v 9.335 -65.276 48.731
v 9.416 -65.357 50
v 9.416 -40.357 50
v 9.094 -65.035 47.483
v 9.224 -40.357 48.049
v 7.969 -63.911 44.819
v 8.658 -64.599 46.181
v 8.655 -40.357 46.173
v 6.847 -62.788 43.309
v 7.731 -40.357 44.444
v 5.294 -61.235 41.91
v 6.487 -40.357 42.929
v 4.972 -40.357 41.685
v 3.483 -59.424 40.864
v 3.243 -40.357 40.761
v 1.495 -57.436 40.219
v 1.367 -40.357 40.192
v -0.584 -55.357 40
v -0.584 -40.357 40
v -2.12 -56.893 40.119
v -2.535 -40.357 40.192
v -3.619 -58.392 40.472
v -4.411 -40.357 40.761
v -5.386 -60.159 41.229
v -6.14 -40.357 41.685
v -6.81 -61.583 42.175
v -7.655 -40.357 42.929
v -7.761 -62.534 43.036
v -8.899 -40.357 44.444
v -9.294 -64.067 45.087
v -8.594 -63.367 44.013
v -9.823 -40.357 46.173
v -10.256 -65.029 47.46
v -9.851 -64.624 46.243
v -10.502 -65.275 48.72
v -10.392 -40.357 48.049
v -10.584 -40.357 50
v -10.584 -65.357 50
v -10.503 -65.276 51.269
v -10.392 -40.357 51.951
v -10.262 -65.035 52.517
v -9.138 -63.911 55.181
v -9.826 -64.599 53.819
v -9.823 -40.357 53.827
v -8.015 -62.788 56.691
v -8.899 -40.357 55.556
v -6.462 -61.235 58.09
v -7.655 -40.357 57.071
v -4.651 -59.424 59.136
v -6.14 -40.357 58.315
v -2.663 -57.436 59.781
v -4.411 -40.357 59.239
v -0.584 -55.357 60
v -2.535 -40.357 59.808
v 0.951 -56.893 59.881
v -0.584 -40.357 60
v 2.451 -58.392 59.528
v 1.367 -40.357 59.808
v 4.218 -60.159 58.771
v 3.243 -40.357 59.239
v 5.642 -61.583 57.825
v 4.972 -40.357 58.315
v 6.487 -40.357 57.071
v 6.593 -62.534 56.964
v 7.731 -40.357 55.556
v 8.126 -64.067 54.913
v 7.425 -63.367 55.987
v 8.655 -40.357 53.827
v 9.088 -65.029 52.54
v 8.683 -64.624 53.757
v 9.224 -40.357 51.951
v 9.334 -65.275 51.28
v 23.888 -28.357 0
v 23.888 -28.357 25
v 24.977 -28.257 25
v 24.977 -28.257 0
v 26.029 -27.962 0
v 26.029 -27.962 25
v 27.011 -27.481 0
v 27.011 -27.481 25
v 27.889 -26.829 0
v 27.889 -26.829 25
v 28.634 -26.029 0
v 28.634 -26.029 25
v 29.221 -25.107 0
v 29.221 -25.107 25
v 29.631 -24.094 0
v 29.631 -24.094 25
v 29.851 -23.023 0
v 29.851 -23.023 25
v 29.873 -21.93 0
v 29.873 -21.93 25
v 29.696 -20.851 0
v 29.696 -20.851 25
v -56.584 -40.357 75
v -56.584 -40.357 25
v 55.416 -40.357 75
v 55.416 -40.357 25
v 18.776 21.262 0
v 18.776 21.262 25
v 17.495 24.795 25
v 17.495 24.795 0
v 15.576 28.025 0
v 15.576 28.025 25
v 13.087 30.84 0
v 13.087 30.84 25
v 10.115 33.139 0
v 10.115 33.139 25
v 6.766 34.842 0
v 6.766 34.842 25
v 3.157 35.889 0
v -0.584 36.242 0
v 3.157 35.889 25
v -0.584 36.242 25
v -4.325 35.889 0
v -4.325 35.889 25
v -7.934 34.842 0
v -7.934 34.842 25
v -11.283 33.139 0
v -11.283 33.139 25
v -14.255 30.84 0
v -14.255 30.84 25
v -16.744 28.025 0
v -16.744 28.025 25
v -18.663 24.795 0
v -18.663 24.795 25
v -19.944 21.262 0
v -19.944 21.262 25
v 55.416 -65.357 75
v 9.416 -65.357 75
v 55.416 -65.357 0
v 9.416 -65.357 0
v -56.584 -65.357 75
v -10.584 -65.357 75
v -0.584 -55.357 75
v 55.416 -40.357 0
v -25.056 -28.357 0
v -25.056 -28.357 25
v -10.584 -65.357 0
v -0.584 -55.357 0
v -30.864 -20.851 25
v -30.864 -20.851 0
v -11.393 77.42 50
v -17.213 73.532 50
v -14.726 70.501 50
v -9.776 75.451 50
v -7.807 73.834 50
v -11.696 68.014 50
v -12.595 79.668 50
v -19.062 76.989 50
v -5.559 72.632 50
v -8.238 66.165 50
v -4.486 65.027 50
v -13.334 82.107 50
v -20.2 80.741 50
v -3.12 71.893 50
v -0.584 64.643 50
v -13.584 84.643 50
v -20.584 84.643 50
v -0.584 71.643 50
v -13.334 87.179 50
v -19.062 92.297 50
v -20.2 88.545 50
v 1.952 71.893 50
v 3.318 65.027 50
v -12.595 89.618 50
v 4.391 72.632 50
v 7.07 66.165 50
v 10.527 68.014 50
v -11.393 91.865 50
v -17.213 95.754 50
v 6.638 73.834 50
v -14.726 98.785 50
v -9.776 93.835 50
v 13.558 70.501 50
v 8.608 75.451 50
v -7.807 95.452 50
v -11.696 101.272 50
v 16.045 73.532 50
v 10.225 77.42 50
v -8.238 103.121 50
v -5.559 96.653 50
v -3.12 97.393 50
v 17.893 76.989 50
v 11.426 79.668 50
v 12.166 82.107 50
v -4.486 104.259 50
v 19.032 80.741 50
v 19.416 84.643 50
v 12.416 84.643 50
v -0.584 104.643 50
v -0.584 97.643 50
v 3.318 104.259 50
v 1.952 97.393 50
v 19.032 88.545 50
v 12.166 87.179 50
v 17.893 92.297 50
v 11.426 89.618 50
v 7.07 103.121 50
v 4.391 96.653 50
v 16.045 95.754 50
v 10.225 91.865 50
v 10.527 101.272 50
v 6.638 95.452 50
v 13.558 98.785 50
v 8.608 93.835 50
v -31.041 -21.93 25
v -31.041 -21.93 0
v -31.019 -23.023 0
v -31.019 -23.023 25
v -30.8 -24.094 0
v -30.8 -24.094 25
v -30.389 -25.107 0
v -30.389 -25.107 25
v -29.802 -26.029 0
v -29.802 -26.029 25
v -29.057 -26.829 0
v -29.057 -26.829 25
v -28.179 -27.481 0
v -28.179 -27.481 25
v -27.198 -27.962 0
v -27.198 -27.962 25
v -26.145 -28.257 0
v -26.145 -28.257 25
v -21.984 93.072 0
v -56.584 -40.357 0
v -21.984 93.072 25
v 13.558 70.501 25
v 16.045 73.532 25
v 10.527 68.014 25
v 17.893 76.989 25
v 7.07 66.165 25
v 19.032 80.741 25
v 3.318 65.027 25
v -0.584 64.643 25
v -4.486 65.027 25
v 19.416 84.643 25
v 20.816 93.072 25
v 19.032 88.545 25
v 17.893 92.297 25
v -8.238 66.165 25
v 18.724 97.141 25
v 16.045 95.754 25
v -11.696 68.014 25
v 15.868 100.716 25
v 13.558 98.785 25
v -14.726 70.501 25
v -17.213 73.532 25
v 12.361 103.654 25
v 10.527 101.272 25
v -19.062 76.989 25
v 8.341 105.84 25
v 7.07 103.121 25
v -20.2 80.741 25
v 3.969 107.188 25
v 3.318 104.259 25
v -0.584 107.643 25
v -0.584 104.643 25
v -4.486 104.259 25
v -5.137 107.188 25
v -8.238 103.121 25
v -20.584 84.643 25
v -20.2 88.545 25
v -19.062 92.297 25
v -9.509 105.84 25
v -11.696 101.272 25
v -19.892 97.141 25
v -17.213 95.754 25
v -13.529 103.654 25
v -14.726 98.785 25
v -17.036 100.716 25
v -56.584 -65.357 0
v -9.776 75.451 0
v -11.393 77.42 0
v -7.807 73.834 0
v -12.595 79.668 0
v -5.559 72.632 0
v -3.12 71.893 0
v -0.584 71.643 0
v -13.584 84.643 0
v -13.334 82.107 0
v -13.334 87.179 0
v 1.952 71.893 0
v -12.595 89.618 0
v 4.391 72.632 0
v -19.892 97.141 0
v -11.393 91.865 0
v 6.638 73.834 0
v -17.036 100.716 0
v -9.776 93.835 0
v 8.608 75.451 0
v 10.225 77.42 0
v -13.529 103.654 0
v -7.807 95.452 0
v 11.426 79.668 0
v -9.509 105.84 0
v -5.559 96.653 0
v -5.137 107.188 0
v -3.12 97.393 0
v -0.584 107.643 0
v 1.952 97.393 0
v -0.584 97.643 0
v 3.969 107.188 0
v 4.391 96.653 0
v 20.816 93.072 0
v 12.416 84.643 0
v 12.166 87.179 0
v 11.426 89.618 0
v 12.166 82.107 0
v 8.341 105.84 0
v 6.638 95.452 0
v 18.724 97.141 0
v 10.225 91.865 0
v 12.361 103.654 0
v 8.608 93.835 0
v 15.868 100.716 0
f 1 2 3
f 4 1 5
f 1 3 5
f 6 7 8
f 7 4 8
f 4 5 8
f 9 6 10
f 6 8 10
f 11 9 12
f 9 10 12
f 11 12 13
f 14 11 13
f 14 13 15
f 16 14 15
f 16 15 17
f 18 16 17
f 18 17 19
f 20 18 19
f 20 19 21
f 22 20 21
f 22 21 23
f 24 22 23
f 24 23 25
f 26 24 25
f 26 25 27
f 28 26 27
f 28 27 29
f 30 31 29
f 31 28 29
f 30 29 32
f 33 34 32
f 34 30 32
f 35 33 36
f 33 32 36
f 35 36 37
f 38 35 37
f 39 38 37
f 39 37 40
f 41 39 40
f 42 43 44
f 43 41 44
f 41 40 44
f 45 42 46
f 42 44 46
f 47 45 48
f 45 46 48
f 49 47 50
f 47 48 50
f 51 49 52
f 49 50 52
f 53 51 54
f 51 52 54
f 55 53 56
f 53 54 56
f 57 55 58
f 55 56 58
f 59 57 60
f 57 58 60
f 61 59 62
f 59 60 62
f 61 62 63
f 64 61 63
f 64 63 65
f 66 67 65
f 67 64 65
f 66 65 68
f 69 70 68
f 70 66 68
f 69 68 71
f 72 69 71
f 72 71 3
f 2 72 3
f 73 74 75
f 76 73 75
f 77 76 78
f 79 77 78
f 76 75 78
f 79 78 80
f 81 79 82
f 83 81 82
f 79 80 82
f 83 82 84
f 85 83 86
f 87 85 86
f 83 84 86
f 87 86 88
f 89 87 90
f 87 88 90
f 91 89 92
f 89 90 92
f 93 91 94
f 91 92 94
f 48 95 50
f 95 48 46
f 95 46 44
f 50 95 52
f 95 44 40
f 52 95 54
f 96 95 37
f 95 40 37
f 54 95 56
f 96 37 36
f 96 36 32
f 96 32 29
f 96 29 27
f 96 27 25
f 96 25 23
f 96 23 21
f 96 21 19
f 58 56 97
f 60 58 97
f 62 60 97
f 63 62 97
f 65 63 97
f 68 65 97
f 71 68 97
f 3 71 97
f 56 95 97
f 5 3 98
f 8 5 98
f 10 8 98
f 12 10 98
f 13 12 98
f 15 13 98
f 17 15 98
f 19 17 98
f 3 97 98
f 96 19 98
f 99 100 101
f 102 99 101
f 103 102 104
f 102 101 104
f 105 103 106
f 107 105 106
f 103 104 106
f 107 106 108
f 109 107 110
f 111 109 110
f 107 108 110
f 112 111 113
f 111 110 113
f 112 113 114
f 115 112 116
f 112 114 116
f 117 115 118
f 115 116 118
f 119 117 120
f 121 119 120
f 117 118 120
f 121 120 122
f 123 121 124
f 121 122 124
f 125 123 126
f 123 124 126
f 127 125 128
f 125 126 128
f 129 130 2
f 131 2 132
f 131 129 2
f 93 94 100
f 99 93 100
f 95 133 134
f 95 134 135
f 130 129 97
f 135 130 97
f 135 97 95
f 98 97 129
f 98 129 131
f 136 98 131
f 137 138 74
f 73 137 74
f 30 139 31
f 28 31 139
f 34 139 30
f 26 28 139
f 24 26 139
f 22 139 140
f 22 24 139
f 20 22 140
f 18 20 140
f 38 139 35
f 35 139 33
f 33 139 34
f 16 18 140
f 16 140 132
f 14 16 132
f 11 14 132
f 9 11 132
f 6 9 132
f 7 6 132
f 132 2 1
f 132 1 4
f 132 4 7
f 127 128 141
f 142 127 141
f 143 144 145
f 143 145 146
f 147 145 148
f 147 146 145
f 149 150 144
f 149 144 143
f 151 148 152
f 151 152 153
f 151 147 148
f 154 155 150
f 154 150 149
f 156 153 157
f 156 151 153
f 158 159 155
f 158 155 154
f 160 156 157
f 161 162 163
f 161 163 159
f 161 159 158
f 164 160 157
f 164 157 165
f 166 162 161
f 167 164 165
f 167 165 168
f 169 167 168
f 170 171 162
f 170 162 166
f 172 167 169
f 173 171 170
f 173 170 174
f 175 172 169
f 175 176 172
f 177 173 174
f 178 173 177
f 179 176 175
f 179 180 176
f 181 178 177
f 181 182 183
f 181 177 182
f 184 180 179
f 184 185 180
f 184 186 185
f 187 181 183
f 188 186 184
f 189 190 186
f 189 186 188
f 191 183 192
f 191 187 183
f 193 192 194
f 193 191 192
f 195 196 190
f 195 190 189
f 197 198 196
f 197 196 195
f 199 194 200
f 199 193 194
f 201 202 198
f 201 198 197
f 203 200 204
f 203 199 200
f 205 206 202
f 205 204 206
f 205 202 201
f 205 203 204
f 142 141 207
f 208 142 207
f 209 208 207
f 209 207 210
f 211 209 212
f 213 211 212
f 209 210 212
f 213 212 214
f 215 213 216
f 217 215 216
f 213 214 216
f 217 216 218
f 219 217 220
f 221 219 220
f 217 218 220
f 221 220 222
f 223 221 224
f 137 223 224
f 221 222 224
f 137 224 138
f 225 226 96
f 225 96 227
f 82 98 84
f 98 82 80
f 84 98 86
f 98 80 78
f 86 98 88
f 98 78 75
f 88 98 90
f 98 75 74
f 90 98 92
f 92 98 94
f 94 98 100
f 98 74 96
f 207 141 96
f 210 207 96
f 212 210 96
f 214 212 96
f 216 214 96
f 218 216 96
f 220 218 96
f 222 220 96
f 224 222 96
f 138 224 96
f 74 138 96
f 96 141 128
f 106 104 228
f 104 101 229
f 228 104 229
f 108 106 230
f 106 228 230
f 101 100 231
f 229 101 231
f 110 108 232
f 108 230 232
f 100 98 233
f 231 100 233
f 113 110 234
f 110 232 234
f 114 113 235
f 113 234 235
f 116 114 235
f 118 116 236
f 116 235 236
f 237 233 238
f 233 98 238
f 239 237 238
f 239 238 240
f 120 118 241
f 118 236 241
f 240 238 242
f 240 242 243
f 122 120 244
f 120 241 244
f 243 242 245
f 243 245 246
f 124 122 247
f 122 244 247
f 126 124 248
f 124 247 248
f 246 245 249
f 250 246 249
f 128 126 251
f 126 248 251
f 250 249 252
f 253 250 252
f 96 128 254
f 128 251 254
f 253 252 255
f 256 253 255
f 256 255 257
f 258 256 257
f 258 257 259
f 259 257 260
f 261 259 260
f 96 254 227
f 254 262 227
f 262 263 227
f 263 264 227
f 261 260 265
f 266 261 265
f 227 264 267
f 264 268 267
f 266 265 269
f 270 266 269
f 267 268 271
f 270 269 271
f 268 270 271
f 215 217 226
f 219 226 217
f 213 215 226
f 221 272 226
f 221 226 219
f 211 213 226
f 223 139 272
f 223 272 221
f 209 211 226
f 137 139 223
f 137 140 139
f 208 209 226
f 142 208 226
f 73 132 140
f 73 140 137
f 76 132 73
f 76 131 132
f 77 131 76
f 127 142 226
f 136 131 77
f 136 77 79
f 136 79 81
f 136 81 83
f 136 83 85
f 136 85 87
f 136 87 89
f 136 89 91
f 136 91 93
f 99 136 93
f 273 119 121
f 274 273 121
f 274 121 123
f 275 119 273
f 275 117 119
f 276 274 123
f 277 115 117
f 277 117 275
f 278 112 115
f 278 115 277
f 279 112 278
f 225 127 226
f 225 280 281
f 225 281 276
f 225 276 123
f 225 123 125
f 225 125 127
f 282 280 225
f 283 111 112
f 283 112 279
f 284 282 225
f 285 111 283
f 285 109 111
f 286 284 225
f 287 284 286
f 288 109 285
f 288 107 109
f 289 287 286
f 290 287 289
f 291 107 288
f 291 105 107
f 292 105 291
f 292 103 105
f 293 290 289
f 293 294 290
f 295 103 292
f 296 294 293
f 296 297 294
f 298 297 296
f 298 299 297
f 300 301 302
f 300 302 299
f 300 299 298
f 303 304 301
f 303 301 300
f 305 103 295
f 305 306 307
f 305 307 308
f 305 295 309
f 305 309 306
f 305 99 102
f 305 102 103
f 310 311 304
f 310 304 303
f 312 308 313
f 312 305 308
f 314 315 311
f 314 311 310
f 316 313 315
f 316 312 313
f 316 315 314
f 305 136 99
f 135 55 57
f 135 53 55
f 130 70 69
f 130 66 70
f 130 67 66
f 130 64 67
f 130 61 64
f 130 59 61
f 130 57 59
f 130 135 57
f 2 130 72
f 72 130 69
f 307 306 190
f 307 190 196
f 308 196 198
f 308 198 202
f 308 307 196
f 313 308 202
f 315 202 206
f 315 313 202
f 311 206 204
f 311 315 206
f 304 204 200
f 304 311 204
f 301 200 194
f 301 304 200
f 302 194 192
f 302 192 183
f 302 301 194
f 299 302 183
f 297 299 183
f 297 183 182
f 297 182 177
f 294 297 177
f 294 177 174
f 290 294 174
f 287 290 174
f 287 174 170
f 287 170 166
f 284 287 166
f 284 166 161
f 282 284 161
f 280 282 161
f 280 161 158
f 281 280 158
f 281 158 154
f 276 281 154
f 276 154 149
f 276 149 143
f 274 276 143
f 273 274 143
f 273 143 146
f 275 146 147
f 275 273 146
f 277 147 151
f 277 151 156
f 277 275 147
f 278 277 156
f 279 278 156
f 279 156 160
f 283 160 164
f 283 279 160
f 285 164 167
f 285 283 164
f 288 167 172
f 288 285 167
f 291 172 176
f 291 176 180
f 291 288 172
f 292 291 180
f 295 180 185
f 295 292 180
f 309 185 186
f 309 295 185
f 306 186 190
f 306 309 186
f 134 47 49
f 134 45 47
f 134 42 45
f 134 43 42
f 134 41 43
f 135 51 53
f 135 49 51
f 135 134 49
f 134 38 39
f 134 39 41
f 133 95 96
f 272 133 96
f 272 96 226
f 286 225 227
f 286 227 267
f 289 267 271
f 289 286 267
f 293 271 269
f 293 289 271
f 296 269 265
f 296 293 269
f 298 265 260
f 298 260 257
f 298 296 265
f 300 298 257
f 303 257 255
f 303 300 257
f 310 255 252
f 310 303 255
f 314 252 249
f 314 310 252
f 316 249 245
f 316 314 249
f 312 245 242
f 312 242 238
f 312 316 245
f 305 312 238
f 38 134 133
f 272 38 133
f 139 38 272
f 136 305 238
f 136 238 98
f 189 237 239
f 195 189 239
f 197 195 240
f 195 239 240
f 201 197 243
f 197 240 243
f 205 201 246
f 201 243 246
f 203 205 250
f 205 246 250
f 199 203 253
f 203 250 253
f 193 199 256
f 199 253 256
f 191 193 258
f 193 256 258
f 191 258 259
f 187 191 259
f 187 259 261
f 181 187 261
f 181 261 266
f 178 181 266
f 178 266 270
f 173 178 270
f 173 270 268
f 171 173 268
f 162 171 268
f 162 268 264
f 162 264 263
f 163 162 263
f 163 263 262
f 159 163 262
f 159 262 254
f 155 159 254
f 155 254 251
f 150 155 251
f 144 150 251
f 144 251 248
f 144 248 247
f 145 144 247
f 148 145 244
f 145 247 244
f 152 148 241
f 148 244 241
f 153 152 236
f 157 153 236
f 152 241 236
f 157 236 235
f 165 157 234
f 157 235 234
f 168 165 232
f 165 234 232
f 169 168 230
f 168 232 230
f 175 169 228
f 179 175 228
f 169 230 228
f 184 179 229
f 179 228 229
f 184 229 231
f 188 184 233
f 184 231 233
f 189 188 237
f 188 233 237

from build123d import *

# Parameters (mm, degrees)
IZIM1_R                          = 20
IZIM1_R_2                        = 13
Y_KSEKLIK_EKSTR_ZYON1_DEPTH      = 25
IZIM2_W                          = 75
IZIM2_H                          = 25
Y_KSEKLIK_EKSTR_ZYON3_DEPTH      = 55.415897
Y_KSEKLIK_EKSTR_ZYON3_DEPTH_BACK = 56.584103
KES_EKSTR_ZYON1_DEPTH            = 76
IZIM5_R                          = 10
KES_EKSTR_ZYON2_DEPTH            = 26
KES_EKSTR_ZYON3_DEPTH            = 26
IZIM1_7_R                        = 20
IZIM1_7_R_2                      = 13
Y_KSEKLIK_EKSTR_ZYON6_DEPTH      = 50


with BuildPart() as part:
    # Çizim1 → Yükseklik-Ekstrüzyon1 (new body)
    with BuildSketch(Plane.XY):
        with BuildLine():
            Line((20.815714115, 93.071898447), (55.415896847, -40.357088497))
            Line((55.415896847, -40.357088497), (-56.584103153, -40.357088497))
            Line((-56.584103153, -40.357088497), (-21.983920421, 93.071898447))
            ThreePointArc((-21.983920421, 93.071898447), (-0.584103153, 107.642911503), (20.815714115, 93.071898447))
        make_face()
        with Locations((-0.584103153, 84.642911503)):
            Circle(IZIM1_R, mode=Mode.SUBTRACT)
        with Locations((-0.584103153, 84.642911503)):
            Circle(IZIM1_R)
        with Locations((-0.584103153, 84.642911503)):
            Circle(IZIM1_R_2, mode=Mode.SUBTRACT)
    extrude(amount=Y_KSEKLIK_EKSTR_ZYON1_DEPTH)

    # Çizim2 → Yükseklik-Ekstrüzyon3 (add, two sides)
    with BuildSketch(Plane(origin=(0, 0, 0), x_dir=(0, 0, -1), z_dir=(1, 0, 0))) as y_kseklik_ekstr_zyon3_sk:
        with Locations((-37.5, -52.857088497)):
            Rectangle(IZIM2_W, IZIM2_H)
    extrude(amount=Y_KSEKLIK_EKSTR_ZYON3_DEPTH)
    extrude(y_kseklik_ekstr_zyon3_sk.sketch, amount=-Y_KSEKLIK_EKSTR_ZYON3_DEPTH_BACK)

    # Çizim3 → Kes-Ekstrüzyon1 (cut, through all)
    with BuildSketch(Plane.XY.offset(75)):
        Polygon((-10.584103153, -65.357088497), (-0.584103153, -55.357088497), (9.415896847, -65.357088497), align=None)
    extrude(amount=-KES_EKSTR_ZYON1_DEPTH, mode=Mode.SUBTRACT)

    # Çizim5 → Kes-Ekstrüzyon2 (cut, through all)
    with BuildSketch(Plane(origin=(0, -40.357088497, 0), x_dir=(1, 0, 0), z_dir=(0, 1, 0))):
        with Locations((-0.584103153, -50)):
            Circle(IZIM5_R)
    extrude(amount=-KES_EKSTR_ZYON2_DEPTH, mode=Mode.SUBTRACT)

    # Çizim8 → Kes-Ekstrüzyon3 (cut, through all)
    with BuildSketch(Plane.XY.offset(25)):
        with BuildLine():
            Line((-19.943777352, 21.2621788), (-30.864373198, -20.851010365))
            ThreePointArc((-30.864373198, -20.851010365), (-29.801809113, -26.028840886), (-25.056470938, -28.357088497))
            Line((-25.056470938, -28.357088497), (23.888264632, -28.357088497))
            ThreePointArc((23.888264632, -28.357088497), (28.633602807, -26.028840886), (29.696166892, -20.851010365))
            Line((29.696166892, -20.851010365), (18.775571046, 21.2621788))
            ThreePointArc((18.775571046, 21.2621788), (-0.584103153, 36.241918358), (-19.943777352, 21.2621788))
        make_face()
    extrude(amount=-KES_EKSTR_ZYON3_DEPTH, mode=Mode.SUBTRACT)

    # Çizim1<7> → Yükseklik-Ekstrüzyon6 (add)
    with BuildSketch(Plane.XY):
        with Locations((-0.584103153, 84.642911503)):
            Circle(IZIM1_7_R)
        with Locations((-0.584103153, 84.642911503)):
            Circle(IZIM1_7_R_2, mode=Mode.SUBTRACT)
    extrude(amount=Y_KSEKLIK_EKSTR_ZYON6_DEPTH)


solid = part.part
